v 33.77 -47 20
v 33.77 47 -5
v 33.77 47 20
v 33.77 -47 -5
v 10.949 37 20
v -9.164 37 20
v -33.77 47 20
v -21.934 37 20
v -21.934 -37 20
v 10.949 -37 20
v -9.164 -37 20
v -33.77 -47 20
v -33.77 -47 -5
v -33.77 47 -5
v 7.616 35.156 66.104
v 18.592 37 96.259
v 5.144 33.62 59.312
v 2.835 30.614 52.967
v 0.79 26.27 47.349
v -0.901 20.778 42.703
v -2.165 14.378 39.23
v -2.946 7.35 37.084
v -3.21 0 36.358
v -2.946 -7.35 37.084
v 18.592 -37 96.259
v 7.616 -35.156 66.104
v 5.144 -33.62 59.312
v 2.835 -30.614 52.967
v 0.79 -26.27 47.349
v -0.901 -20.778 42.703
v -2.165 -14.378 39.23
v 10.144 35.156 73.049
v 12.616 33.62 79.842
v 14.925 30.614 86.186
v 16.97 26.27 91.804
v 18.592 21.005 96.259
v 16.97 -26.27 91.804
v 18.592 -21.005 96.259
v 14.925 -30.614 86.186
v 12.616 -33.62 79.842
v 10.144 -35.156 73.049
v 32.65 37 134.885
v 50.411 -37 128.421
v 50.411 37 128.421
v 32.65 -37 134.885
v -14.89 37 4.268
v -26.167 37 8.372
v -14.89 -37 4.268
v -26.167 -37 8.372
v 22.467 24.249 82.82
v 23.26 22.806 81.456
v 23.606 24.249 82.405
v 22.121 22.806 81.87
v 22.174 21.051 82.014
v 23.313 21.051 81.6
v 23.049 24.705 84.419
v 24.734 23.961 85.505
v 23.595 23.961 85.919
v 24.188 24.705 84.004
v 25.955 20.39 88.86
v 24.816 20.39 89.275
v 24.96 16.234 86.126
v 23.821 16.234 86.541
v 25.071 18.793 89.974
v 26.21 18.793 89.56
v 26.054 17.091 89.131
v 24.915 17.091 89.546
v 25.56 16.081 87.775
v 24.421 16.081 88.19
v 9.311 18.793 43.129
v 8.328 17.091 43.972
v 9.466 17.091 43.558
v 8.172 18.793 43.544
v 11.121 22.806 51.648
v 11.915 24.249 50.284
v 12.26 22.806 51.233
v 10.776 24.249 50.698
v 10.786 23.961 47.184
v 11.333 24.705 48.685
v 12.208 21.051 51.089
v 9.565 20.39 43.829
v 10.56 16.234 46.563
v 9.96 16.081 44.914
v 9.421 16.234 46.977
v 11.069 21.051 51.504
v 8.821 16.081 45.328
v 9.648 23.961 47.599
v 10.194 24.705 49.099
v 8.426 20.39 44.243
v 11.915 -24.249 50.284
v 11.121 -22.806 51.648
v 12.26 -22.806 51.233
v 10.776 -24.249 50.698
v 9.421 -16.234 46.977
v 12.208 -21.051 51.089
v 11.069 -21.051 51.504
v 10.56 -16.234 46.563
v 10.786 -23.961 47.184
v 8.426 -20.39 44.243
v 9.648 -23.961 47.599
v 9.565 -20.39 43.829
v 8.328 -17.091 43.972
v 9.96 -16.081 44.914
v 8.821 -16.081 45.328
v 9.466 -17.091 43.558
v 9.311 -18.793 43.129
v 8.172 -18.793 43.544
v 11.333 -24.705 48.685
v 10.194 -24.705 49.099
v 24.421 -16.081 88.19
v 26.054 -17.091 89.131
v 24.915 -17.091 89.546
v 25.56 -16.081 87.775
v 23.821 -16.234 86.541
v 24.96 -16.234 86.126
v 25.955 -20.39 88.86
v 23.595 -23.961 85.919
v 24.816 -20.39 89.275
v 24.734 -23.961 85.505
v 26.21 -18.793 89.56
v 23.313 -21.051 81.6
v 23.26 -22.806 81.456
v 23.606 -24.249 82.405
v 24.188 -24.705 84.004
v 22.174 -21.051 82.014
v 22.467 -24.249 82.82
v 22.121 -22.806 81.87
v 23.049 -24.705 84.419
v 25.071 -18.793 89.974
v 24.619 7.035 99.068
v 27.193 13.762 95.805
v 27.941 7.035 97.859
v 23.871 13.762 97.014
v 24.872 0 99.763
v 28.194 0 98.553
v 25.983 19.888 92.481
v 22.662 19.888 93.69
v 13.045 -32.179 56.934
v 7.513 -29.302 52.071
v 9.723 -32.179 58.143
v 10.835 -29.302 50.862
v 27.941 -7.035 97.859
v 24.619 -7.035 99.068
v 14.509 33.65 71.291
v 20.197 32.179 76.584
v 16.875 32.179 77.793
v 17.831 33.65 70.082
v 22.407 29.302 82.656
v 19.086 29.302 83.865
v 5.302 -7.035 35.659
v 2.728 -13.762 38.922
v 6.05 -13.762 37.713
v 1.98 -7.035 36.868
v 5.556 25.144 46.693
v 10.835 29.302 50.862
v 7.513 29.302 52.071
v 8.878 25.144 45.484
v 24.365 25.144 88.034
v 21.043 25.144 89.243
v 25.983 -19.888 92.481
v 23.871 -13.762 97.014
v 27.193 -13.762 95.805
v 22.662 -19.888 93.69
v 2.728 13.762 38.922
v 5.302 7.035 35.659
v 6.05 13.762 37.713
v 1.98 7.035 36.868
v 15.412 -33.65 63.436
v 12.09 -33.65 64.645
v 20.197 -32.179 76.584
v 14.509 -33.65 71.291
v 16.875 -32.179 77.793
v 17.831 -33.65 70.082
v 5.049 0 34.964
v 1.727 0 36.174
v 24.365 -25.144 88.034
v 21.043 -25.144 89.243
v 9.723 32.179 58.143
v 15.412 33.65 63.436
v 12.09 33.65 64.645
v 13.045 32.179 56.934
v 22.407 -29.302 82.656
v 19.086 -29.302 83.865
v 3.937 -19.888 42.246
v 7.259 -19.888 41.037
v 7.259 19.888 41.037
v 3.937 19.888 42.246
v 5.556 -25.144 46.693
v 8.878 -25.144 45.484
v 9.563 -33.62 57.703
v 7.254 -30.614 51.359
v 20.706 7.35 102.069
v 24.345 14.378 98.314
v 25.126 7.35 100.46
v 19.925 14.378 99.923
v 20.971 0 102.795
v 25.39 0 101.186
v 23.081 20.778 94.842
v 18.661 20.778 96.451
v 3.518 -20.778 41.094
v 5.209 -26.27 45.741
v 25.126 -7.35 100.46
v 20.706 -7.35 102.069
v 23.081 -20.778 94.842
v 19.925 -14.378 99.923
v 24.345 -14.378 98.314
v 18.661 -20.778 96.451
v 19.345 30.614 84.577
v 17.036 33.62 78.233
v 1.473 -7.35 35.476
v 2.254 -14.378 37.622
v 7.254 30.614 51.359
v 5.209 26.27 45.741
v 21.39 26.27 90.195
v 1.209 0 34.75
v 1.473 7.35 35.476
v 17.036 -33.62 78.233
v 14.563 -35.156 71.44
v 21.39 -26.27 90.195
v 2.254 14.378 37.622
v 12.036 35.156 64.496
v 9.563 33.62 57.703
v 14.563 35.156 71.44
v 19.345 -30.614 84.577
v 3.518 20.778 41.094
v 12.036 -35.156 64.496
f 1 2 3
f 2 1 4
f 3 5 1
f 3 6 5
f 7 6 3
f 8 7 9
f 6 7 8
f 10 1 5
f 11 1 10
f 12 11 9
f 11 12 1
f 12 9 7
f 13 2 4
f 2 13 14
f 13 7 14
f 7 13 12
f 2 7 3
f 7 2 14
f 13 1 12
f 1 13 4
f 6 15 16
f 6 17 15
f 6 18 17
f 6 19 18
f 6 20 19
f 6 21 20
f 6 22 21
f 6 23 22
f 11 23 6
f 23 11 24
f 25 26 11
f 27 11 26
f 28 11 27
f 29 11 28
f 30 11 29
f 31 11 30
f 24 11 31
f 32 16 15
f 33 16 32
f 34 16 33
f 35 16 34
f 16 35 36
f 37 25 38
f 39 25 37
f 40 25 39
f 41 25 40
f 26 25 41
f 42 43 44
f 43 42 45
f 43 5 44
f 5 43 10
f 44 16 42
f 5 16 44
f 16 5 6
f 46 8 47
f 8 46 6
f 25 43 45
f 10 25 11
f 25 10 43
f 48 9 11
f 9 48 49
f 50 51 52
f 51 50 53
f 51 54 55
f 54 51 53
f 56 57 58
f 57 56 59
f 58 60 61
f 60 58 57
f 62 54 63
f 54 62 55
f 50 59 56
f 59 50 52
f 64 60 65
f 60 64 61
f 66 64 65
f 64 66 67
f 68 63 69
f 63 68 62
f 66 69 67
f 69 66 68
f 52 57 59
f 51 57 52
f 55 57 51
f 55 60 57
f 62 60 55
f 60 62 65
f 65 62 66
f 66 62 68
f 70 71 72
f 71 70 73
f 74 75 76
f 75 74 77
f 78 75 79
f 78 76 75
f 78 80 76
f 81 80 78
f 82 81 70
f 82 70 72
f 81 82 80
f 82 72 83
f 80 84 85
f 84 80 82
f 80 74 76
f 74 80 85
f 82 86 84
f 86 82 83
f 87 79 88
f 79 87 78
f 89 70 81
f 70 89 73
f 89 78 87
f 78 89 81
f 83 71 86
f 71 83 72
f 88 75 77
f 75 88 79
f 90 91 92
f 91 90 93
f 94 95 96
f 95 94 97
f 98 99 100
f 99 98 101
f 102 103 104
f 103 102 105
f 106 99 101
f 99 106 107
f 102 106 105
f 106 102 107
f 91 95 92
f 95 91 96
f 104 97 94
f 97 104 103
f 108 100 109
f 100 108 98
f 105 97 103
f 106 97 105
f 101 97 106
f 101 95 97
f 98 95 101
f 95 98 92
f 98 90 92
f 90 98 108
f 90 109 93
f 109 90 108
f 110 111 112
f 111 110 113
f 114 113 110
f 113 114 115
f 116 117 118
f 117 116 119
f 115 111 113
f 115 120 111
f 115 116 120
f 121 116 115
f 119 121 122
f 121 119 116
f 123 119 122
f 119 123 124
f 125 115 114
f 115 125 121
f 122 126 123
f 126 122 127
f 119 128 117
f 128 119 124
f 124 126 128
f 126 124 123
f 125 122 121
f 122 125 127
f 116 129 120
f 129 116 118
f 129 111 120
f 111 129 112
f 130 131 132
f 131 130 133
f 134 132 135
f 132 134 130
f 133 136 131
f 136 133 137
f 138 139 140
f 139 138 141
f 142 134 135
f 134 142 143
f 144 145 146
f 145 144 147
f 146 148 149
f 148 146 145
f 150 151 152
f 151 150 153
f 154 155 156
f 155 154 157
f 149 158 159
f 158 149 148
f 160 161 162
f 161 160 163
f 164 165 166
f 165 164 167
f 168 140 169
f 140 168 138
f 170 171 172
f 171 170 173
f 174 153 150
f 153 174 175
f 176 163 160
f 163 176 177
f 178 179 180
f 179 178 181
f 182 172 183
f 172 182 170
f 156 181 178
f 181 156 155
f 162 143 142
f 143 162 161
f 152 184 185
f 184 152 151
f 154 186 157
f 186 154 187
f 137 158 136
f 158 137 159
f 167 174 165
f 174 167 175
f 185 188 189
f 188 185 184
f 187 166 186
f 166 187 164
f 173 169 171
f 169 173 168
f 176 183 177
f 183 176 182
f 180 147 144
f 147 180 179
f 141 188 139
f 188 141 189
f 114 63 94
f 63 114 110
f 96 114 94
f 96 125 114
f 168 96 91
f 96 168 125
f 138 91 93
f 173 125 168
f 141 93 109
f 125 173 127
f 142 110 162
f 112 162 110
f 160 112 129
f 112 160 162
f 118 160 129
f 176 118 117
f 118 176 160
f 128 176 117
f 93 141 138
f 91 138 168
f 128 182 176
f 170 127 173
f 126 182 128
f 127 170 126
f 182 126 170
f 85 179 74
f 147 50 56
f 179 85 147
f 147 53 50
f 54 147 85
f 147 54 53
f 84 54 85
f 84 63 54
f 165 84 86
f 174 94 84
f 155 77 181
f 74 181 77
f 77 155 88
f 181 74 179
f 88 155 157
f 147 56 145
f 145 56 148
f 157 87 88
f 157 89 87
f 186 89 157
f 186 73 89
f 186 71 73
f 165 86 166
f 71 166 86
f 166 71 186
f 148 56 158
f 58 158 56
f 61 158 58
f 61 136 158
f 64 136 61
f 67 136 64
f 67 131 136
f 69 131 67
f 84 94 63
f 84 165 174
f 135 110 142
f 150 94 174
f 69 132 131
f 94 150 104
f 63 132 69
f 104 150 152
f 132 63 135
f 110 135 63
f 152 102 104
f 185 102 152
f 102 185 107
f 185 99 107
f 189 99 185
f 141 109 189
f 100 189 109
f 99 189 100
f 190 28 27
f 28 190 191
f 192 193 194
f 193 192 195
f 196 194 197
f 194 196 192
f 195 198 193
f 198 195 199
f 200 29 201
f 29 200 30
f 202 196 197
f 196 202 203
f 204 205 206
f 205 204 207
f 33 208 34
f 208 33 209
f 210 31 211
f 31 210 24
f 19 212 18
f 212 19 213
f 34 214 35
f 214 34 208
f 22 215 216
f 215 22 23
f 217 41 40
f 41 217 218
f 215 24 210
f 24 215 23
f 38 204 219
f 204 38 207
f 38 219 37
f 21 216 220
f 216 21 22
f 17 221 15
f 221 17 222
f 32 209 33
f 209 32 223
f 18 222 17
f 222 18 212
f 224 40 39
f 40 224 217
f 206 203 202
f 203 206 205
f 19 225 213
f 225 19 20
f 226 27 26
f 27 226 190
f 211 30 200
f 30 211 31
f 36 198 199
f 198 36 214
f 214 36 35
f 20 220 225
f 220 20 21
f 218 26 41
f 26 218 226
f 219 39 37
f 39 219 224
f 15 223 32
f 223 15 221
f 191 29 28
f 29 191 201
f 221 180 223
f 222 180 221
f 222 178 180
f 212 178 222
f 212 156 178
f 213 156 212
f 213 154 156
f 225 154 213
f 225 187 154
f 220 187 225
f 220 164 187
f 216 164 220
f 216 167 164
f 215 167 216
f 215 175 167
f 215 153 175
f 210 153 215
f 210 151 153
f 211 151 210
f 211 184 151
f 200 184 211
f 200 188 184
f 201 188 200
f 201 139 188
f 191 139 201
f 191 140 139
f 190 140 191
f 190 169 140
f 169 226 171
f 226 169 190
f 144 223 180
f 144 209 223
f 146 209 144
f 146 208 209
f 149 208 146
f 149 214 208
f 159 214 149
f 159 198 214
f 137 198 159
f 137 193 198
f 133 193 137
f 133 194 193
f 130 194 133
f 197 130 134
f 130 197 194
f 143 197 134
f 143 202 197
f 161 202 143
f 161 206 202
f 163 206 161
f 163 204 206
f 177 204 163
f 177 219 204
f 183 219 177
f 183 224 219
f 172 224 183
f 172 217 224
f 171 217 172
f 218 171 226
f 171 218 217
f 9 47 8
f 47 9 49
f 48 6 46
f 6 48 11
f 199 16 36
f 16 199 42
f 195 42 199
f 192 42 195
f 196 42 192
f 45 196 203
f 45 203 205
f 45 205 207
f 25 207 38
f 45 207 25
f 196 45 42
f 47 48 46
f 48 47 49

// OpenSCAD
// file: bolts.scad
m2_diameter = 2.2;
m2_nut_diameter = 9999;
m2_nut_thickness = 1.7;
m2_tap_diameter = 9999;

m3_diameter = 3.2;
m3_nut_diameter = 6.4;
m3_nut_thickness = 2.5;
m3_tap_diameter = 2.5;

m4_diameter = 4.2;
m4_nut_diameter = 7.9;
m4_nut_thickness = 2.5;
m4_tap_diameter = 3.4;

m5_diameter = 5.2;
m5_cap_length = 5;
m5_nut_diameter = 9.4;
m5_nut_thickness = 2.7;
m5_tap_diameter = 4.3;
// main file
include <bolts.scad>

show_phone=false;

stand_thickness = 20;
stand_extra = 10;
stand_angle = 70;
base_height = 15;

charger_top_diameter = 70;
charger_top_thickness = 8.2;
charger_bottom_diameter = 67;
charger_bottom_thickness = 3.5;
charger_foot_thickness = 1.2;
charger_foot_width = 5.1;
charger_foot_length = 10.1;

charger_thickness = charger_top_thickness+charger_bottom_thickness+charger_foot_thickness;

cable_clearance_width = 12;
cable_clearance_height = 7;

phone_length = 139;
phone_width = 74;
phone_thickness = 12;

stand_width = phone_width + 2* stand_extra;

difference() {
	union() {
		translate([0,0,base_height/2])
			cube([cos(stand_angle)*phone_length+stand_thickness, stand_width,base_height+stand_extra], center=true);
		translate([0,0,(sin(stand_angle)*phone_length+base_height)/2])
			rotate([0,-stand_angle,0]) translate([0,0,-phone_thickness/2-charger_thickness])
				cube([phone_length,phone_width,phone_thickness/2+charger_thickness],center = true);
	}
	union() {
		translate([0,0,(sin(stand_angle)*phone_length+base_height)/2])
			rotate([0,-stand_angle,0]) {
				translate([0,0,phone_thickness/4-charger_thickness/2])
					cube([phone_length,phone_width,phone_thickness],center = true);
				translate([0,0,-(charger_thickness+phone_thickness/2)])
					scale([1.01,1.01,1.01]) charger();
			}
	}
}

if( show_phone==true )
translate([0,0,(sin(stand_angle)*phone_length+base_height)/2])
	rotate([0,-stand_angle,0]) 
		phone();
//charger();




module phone() {
	color("RoyalBlue") cube([phone_length,phone_width,phone_thickness],center = true);
}
module charger() {
	translate([0,0,charger_foot_thickness])
		cylinder( r=charger_bottom_diameter/2,h=charger_bottom_thickness+0.1);
	translate([0,0,charger_bottom_thickness+charger_foot_thickness])
		cylinder( r=charger_top_diameter/2,h=charger_top_thickness);
	rotate([0,0,45]) {
		for( i = [0:3] ) {
			hull() rotate([0,0,i*90]) {
				translate([28.5,charger_foot_length/2-charger_foot_width/2,0]) 
					cylinder( r = charger_foot_width/2, h = charger_foot_thickness+0.1);
				translate([28.5,-(charger_foot_length/2-charger_foot_width/2),0])
					cylinder( r = charger_foot_width/2, h = charger_foot_thickness+0.1);
			}
		}
	}
}
